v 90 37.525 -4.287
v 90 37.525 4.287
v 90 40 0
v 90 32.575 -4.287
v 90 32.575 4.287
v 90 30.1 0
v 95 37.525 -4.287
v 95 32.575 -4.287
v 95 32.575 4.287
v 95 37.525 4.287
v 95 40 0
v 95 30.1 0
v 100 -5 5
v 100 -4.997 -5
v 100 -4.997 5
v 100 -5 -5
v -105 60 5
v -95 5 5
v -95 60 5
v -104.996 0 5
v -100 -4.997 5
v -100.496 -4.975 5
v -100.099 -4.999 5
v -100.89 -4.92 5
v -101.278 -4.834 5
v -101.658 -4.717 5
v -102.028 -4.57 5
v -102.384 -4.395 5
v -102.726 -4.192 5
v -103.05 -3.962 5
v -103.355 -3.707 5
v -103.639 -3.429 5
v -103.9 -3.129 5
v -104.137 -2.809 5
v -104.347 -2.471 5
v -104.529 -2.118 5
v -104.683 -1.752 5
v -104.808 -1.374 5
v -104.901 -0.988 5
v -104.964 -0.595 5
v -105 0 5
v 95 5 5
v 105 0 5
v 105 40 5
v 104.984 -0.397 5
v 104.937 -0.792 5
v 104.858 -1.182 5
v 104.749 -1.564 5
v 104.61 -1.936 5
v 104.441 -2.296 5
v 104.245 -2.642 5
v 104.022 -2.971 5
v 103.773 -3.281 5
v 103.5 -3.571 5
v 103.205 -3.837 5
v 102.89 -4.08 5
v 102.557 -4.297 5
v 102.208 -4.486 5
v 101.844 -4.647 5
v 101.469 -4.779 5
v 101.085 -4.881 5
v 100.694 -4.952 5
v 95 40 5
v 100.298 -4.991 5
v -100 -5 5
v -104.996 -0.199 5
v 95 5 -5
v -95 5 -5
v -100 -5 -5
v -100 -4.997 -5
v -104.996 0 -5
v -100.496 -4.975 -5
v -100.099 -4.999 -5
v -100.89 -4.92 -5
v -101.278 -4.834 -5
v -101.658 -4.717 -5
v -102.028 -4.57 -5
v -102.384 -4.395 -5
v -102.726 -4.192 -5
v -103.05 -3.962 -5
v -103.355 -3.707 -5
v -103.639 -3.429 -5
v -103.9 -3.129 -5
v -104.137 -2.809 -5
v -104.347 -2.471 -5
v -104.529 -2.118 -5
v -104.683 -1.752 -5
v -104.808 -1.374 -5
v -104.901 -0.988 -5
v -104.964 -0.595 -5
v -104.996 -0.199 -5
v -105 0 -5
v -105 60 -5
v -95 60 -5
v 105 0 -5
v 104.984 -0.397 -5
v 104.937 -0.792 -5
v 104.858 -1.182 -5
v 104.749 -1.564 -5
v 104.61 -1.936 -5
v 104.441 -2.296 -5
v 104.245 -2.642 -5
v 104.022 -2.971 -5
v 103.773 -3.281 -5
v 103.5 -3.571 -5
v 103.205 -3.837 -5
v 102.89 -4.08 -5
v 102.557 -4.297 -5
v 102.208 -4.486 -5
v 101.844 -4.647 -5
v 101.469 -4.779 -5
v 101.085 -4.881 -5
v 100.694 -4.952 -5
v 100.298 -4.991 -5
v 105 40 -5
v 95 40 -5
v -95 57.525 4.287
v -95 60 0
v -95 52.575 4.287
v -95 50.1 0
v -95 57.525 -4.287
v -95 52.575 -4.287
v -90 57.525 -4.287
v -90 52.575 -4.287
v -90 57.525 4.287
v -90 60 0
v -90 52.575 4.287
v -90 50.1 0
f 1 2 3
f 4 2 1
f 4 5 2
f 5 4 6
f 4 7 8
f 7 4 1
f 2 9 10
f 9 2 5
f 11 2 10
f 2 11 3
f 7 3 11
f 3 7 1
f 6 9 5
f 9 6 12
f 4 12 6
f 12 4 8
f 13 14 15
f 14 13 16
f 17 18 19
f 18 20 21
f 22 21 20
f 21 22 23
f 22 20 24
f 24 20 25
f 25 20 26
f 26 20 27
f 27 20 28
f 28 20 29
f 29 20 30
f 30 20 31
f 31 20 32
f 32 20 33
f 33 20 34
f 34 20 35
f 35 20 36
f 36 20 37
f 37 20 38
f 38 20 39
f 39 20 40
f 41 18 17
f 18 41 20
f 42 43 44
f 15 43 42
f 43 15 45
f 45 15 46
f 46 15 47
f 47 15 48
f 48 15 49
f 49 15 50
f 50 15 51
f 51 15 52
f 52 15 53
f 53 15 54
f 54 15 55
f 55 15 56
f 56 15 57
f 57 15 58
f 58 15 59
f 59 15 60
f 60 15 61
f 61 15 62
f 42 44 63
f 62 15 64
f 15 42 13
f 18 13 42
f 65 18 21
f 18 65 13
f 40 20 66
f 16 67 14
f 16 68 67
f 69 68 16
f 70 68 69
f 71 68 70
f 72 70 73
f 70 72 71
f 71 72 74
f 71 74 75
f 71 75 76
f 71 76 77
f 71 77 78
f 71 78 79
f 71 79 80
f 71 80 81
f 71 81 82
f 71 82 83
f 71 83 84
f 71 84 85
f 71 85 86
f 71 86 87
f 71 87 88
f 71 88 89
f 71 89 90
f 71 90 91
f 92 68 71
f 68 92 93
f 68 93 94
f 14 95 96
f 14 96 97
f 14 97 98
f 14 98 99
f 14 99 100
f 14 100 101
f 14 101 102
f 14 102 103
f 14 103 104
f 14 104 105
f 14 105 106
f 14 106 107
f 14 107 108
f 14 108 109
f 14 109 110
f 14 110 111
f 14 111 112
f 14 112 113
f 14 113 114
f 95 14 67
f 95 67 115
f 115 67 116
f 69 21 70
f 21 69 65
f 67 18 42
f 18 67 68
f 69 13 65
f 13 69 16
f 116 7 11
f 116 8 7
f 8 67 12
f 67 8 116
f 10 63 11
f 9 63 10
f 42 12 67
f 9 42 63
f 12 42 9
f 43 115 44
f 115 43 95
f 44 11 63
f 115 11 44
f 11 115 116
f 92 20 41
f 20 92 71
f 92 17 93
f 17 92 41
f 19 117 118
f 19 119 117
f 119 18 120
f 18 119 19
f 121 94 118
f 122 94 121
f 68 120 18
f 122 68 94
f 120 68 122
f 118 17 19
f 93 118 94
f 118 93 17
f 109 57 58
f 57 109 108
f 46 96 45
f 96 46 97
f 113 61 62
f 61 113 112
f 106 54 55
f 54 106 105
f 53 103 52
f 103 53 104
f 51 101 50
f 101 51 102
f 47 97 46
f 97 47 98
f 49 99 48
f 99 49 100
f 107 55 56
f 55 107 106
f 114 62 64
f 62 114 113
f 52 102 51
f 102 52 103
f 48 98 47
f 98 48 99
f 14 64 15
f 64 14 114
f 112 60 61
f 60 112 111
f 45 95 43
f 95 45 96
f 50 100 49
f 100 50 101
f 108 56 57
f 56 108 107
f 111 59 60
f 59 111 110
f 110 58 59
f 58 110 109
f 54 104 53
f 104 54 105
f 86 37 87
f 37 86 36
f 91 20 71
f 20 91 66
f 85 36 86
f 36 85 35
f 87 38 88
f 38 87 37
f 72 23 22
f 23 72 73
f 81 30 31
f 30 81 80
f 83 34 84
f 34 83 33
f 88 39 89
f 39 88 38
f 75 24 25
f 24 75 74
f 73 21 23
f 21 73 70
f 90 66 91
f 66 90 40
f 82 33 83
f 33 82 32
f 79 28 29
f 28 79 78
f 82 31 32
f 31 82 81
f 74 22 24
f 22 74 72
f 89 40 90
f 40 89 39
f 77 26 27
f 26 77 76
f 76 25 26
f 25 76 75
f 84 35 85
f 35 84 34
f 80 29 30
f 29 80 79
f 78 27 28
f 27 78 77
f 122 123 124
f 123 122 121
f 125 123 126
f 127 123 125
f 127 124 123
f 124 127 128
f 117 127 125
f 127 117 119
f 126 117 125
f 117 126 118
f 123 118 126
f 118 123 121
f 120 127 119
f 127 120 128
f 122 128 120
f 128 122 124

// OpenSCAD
// file: hexagon.scad
module extruding_hexagon(height = 4, radius = 5, center = false) {
  linear_extrude(height = height, center=center) {
      rotate([0, 0, 30])
        circle(r=radius, $fn=6);
  }
}
// main file
use <hexagon.scad>
//     Top
// ______________________
// |                    | <--- Connector hexagon
// |
// |
// |
// | <--- Side
// |
// |
// |
// |____________________| <--- Connector hexagon
//    Bottom
//
// Top, Side and Bottom together form a U profile.

// Minimal angle for a fragment
$fa = 1;
// Minimal size for a fragment
$fs = 0.4;

connector_height = 10; // Only 5 mm is visible, 4 mm is needed for the connector
connector_diameter = 9.9;

// U profile
u_profile_thickness = 10;
u_profile_top_length = 40;
u_profile_bottom_length = 60;
u_profile_side_length = 200;


// Top connector hexagon
translate([u_profile_side_length/2-connector_height/2, u_profile_top_length-connector_diameter/2, 0])
rotate([0, 90, 0])
extruding_hexagon(height=connector_height, radius=connector_diameter/2, center=true);

// U profile - side
cube([u_profile_side_length, u_profile_thickness, u_profile_thickness], center=true);
// U profile - top
translate([u_profile_side_length/2, u_profile_top_length/2, 0])
rotate([0, 0, 90])
cube([u_profile_top_length, u_profile_thickness, u_profile_thickness], center=true);
// U profile - bottom
translate([-u_profile_side_length/2, u_profile_bottom_length/2, 0])
rotate([0, 0, 90])
cube([u_profile_bottom_length, u_profile_thickness, u_profile_thickness], center=true);
// U profile - rounded corners - side<->top
translate([u_profile_side_length/2, 0, 0])
cylinder(r=u_profile_thickness/2, h=u_profile_thickness, center=true);

// U profile - rounded corners - side<->bottom
translate([-u_profile_side_length/2, 0, 0])
cylinder(r=u_profile_thickness/2, h=u_profile_thickness, center=true);

// Bottom connector hexagon
translate([-u_profile_side_length/2+connector_height/2, u_profile_bottom_length-connector_diameter/2, 0])
rotate([0, 90, 0])
extruding_hexagon(height=connector_height, radius=connector_diameter/2, center=true);
